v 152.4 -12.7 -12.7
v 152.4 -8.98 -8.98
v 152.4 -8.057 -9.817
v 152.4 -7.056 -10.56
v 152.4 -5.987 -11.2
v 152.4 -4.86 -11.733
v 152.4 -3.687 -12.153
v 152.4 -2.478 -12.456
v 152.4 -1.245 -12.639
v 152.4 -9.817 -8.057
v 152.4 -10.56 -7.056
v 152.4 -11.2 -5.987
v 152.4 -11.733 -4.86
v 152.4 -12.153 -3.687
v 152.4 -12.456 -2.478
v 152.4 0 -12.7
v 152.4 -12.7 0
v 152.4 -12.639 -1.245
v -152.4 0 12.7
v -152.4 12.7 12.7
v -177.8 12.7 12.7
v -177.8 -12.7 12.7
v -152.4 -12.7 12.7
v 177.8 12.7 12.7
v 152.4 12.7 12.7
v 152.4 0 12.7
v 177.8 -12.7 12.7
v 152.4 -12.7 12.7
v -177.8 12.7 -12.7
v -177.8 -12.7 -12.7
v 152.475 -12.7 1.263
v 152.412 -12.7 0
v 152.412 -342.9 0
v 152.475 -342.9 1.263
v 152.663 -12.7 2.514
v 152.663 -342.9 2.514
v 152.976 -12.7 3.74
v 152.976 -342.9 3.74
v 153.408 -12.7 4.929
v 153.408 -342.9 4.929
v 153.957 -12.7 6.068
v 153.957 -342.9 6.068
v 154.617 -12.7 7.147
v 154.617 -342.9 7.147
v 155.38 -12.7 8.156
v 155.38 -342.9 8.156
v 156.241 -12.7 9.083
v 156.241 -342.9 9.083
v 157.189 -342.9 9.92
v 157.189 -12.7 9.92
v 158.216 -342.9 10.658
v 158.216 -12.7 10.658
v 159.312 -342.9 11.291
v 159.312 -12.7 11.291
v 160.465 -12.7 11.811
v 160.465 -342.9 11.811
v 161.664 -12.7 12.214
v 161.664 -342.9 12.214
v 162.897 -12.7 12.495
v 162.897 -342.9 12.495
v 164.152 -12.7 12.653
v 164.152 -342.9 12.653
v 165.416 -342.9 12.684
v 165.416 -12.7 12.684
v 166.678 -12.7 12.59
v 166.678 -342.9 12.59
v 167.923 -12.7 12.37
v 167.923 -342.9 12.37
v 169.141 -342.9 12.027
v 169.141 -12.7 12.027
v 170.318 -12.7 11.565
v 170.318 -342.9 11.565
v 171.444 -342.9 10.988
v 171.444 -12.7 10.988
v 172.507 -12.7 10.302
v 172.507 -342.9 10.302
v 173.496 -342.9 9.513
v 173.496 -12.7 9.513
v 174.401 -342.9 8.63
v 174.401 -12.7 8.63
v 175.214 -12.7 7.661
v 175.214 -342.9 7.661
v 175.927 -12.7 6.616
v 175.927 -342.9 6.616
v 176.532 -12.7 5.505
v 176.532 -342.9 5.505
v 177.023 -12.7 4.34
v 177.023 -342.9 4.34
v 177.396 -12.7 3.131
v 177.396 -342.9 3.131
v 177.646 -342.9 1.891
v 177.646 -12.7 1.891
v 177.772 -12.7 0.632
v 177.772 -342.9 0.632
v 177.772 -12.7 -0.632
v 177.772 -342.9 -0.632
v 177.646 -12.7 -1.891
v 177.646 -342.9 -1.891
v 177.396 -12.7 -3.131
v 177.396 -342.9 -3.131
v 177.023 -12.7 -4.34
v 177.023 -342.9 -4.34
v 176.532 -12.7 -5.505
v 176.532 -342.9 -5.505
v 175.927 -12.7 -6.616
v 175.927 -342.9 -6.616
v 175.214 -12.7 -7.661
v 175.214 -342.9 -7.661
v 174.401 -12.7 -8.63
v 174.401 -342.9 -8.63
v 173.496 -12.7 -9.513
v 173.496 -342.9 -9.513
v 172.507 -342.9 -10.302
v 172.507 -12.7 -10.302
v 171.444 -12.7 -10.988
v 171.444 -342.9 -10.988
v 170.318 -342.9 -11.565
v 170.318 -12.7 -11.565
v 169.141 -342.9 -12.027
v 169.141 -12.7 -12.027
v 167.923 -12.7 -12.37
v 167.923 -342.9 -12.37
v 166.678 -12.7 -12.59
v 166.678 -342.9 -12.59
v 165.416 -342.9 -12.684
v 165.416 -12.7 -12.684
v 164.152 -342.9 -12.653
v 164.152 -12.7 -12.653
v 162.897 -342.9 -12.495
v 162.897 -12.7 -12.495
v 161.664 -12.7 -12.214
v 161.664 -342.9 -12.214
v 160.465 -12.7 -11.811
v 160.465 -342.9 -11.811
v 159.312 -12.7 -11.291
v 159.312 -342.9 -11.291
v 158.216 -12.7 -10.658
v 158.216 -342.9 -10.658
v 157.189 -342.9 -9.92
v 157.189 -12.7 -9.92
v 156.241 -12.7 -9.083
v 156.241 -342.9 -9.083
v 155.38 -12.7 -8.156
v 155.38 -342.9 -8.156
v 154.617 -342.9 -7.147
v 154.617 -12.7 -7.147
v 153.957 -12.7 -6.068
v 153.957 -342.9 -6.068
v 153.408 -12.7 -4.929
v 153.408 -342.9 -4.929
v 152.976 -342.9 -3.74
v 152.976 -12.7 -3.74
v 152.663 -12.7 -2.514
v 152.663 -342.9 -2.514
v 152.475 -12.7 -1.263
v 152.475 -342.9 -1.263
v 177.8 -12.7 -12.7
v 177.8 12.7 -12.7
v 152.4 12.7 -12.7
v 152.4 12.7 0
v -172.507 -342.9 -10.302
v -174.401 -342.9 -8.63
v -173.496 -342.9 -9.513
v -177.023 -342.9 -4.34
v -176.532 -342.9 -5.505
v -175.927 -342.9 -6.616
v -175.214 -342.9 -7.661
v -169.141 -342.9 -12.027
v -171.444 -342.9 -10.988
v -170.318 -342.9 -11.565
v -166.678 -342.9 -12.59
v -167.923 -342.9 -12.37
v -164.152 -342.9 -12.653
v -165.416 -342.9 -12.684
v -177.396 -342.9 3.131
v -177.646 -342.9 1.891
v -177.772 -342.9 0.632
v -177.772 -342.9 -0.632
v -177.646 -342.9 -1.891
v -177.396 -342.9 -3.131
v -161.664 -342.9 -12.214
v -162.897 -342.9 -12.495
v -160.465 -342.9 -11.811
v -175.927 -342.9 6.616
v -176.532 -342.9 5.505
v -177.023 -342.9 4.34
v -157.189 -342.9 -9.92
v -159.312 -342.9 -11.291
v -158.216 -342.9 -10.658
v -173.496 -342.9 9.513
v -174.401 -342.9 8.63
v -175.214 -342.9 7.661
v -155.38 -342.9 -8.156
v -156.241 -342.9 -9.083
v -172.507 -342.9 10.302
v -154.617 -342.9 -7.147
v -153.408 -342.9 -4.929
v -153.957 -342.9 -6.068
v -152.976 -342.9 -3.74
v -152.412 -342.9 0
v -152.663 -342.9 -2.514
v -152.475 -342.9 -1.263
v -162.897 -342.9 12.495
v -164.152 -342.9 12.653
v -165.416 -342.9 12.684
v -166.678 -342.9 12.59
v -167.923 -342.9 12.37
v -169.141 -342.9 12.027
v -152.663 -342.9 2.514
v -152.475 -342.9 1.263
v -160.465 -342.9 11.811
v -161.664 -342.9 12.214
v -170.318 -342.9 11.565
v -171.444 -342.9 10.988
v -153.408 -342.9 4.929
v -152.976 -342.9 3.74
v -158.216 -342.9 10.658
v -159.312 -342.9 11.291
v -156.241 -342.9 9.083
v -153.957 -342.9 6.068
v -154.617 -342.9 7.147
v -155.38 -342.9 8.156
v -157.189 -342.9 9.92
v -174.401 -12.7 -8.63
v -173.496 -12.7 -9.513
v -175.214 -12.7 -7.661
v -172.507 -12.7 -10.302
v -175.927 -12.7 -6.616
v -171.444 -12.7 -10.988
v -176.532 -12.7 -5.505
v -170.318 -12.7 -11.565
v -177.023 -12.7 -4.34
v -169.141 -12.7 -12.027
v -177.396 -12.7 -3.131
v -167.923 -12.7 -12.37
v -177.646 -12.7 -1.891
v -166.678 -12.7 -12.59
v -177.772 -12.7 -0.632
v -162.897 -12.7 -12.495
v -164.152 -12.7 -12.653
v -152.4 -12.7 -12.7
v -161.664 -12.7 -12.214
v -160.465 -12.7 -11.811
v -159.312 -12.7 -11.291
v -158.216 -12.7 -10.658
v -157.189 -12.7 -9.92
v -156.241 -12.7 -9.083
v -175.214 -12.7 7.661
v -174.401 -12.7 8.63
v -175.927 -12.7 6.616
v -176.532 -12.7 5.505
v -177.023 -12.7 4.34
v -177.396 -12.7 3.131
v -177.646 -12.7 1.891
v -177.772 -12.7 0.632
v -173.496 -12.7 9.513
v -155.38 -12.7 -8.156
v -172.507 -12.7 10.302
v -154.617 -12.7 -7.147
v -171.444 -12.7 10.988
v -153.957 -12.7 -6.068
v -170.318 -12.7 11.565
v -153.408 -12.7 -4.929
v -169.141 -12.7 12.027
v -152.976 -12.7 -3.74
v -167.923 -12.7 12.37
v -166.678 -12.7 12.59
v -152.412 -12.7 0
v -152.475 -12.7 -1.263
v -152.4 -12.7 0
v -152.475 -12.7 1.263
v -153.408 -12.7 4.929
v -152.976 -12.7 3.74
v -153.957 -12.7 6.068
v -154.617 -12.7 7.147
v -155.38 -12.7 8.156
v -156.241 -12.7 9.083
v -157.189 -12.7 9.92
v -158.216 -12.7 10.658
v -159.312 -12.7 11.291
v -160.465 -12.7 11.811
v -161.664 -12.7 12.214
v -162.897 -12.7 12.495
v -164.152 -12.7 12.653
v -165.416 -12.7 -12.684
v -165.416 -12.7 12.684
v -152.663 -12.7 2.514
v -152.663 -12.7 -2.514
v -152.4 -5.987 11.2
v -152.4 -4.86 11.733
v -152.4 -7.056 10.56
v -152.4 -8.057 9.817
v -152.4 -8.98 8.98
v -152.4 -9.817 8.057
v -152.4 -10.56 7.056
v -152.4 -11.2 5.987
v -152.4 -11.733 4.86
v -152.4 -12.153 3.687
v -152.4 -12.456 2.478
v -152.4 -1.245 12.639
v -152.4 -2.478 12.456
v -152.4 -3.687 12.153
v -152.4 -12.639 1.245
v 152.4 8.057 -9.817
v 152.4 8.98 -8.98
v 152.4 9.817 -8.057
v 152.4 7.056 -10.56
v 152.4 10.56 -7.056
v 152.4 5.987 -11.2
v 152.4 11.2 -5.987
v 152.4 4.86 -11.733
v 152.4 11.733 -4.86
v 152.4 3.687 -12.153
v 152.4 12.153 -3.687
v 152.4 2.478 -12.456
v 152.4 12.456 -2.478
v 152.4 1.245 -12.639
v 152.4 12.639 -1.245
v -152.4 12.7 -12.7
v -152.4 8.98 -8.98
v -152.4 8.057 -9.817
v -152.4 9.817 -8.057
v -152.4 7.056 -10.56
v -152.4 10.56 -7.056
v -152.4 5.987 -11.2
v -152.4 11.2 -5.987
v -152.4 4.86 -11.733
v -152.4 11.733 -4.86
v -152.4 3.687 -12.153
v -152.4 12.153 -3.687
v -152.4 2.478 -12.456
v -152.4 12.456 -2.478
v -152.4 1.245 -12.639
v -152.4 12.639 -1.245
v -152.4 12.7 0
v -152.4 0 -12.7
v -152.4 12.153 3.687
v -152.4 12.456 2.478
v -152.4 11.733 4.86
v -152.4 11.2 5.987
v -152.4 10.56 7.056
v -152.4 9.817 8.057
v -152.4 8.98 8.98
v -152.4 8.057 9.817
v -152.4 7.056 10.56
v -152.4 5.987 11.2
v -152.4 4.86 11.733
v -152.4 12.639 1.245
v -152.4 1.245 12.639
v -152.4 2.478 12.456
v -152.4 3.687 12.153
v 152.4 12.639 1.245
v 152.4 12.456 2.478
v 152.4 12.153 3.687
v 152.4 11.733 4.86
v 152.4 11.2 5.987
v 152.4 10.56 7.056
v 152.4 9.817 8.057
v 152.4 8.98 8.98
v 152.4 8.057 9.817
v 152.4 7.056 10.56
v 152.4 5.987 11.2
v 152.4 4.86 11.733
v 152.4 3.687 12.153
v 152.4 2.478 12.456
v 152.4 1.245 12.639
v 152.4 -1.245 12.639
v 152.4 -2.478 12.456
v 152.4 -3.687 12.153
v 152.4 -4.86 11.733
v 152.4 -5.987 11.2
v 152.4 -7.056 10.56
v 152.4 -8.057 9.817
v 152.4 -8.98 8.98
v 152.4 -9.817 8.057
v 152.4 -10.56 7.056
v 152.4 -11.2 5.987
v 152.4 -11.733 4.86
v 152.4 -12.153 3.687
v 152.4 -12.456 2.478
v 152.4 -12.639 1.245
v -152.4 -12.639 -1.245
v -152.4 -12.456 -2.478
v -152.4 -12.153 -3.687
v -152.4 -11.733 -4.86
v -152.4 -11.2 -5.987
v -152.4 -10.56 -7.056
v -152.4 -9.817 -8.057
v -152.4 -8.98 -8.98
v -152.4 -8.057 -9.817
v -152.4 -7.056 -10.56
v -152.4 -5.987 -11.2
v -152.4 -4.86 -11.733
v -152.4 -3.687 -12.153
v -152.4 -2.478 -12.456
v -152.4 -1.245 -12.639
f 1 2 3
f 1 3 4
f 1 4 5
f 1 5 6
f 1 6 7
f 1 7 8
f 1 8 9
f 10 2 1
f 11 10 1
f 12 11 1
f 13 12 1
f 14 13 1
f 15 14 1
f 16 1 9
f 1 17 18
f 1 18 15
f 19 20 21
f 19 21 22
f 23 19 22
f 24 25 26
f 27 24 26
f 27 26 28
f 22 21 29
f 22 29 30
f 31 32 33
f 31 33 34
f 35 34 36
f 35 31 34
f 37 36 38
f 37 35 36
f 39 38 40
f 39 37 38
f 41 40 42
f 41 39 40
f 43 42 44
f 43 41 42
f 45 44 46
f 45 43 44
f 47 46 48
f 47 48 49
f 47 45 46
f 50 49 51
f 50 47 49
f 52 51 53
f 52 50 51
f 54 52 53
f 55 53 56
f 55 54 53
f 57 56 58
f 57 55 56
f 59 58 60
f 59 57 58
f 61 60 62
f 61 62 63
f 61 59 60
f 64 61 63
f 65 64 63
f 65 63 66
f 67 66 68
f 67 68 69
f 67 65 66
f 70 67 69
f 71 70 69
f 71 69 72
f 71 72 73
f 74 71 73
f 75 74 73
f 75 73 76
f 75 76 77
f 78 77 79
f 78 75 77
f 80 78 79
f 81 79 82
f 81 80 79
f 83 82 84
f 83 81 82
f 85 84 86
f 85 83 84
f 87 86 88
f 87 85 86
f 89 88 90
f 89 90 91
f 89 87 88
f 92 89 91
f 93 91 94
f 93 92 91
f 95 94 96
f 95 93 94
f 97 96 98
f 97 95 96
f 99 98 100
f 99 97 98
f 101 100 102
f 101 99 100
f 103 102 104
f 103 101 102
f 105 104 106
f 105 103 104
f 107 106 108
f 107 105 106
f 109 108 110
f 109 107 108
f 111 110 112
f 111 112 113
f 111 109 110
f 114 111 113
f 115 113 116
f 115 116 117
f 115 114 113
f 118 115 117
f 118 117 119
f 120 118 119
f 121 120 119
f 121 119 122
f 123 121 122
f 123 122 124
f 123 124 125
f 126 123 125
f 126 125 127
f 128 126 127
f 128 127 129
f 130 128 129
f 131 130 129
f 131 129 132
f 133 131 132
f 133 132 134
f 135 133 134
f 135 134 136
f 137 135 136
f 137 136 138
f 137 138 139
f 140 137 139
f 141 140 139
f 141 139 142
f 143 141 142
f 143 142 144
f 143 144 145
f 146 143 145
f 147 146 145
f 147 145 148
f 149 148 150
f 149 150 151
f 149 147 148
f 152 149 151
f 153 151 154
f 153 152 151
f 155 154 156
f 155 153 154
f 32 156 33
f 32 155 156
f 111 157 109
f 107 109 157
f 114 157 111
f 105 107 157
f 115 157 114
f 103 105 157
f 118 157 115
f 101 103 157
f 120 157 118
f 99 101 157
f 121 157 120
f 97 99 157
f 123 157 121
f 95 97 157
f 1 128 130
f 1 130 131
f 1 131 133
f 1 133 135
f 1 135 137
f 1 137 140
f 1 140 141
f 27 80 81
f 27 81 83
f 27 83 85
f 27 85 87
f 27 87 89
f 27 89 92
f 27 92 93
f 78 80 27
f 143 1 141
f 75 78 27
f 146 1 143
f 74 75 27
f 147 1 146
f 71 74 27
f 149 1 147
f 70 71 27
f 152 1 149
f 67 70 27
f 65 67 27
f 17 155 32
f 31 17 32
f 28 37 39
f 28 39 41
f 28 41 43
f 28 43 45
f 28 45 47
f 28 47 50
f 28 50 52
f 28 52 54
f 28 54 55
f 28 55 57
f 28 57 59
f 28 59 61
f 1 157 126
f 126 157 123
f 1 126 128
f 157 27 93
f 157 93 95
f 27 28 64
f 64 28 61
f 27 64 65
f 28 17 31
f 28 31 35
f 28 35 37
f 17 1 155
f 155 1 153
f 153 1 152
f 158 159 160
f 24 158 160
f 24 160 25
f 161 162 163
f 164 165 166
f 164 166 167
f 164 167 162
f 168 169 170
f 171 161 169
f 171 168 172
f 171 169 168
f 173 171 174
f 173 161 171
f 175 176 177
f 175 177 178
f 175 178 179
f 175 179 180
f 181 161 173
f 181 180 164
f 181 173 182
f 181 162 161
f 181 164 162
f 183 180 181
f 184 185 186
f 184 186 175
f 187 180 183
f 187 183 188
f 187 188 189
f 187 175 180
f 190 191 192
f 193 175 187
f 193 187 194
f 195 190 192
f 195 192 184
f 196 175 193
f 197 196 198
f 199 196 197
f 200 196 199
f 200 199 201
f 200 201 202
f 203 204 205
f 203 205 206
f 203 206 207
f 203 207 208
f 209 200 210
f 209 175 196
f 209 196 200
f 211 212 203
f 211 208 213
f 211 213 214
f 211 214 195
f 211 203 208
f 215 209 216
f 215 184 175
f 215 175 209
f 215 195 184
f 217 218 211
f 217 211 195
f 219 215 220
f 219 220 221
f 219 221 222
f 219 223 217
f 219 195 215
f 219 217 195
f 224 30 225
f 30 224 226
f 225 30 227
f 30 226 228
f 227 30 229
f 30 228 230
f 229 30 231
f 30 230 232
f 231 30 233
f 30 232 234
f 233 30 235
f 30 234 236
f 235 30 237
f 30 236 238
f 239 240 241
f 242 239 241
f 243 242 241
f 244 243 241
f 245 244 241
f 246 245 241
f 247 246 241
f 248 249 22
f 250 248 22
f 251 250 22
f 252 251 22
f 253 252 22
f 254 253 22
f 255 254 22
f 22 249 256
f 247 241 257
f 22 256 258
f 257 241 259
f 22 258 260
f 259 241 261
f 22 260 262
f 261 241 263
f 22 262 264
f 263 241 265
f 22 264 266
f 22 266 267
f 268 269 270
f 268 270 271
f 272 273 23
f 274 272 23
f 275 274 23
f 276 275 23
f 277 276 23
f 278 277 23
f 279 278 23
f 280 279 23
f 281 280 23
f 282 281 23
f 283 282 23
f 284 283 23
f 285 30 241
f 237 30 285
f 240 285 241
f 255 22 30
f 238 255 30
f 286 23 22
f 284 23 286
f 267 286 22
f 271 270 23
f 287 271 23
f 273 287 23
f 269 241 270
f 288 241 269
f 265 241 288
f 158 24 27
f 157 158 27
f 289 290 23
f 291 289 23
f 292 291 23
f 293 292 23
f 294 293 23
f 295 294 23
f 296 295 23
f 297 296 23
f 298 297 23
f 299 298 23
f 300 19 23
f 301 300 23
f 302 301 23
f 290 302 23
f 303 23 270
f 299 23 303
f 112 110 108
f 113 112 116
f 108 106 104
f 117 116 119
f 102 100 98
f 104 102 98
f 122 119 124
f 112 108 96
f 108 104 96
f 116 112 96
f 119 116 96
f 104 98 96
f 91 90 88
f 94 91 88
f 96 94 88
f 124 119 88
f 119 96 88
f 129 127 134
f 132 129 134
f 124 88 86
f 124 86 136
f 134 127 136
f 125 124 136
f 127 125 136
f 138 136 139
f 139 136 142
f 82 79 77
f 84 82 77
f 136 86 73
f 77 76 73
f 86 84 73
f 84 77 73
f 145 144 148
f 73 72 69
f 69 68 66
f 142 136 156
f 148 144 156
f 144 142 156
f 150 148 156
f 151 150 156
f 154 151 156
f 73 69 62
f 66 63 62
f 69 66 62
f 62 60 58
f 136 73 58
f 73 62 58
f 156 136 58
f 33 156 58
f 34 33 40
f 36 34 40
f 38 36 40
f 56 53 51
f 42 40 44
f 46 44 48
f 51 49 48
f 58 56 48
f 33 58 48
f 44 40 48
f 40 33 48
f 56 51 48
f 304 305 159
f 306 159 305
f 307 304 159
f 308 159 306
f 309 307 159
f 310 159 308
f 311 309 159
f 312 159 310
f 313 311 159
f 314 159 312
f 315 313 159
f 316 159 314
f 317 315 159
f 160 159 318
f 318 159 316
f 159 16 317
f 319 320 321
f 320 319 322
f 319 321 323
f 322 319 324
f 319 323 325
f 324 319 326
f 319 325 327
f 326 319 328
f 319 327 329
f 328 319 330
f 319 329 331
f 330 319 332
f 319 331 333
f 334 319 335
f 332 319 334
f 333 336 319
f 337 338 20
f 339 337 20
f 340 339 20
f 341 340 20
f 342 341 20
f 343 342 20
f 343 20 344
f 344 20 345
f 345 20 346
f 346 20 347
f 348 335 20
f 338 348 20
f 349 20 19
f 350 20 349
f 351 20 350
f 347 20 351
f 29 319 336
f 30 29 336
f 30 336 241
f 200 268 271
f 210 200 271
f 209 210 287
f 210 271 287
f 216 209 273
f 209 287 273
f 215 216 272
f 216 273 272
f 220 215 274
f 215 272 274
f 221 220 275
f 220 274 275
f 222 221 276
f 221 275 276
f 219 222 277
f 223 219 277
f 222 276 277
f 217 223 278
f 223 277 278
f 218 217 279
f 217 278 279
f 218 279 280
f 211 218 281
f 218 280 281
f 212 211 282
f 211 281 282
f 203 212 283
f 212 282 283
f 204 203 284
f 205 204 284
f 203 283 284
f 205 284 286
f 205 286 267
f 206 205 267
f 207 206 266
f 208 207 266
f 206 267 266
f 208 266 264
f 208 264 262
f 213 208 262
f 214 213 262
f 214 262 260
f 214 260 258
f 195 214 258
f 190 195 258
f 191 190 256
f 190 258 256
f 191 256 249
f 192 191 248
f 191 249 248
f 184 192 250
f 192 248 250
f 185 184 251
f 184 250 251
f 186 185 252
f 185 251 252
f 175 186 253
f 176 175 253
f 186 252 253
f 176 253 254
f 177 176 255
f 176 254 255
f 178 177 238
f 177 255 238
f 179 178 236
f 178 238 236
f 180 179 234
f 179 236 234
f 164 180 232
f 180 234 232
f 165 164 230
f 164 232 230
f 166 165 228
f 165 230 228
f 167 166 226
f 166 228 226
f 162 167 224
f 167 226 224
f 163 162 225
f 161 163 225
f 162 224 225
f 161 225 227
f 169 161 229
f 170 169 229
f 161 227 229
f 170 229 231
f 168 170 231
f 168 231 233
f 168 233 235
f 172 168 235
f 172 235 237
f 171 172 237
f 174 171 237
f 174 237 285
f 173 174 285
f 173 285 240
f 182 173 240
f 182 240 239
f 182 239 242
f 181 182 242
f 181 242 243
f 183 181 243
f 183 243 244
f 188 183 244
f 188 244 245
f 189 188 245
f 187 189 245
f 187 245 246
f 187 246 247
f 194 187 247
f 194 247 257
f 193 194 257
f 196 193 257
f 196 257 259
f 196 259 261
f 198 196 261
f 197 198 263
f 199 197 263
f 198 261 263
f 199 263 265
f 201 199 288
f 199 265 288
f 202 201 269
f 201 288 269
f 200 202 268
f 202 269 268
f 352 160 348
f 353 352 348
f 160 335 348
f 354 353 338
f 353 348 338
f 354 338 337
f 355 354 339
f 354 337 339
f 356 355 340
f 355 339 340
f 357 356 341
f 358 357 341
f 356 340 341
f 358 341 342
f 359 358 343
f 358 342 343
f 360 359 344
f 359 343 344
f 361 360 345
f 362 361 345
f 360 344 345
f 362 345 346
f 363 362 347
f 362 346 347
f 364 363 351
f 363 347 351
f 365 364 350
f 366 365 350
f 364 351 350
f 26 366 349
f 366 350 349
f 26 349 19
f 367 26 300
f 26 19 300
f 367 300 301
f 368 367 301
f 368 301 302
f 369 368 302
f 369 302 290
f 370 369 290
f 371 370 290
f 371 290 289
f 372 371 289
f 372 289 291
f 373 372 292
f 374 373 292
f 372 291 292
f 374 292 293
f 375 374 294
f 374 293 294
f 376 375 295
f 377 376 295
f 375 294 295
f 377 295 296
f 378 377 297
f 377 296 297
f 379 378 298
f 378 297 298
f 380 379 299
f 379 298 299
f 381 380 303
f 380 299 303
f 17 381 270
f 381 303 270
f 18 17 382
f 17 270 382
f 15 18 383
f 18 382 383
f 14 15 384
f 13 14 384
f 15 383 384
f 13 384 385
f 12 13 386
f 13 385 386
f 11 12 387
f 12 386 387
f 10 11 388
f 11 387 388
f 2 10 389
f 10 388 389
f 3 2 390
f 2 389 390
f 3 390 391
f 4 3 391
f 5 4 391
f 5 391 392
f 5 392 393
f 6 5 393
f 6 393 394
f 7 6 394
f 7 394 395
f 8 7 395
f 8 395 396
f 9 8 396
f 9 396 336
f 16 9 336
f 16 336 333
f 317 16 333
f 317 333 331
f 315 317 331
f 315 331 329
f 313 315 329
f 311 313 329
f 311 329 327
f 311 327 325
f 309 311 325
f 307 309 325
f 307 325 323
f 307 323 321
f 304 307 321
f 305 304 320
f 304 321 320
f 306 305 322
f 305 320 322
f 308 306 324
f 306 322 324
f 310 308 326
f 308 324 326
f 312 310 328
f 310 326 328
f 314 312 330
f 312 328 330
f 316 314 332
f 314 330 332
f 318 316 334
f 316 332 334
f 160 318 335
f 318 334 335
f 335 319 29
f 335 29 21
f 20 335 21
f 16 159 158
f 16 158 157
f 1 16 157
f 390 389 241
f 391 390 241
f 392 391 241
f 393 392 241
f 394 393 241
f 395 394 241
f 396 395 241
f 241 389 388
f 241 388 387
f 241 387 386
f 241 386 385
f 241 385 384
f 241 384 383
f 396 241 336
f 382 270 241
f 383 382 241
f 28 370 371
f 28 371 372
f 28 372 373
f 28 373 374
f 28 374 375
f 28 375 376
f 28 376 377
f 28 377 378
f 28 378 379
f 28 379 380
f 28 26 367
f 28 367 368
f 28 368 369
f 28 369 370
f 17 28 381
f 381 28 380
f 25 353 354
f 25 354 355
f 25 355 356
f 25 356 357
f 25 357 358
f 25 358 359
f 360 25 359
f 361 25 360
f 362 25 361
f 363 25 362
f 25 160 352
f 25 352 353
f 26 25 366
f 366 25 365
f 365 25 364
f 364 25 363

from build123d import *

# Parameters (mm, degrees)
F0_R     = 12.7
F1_DEPTH = 152.4
F2_W     = 25.4
F2_H     = 25.4
F3_DEPTH = 25.4
F4_R     = 12.688144
F5_DEPTH = 330.2


with BuildPart() as f1:
    # F0 (on Right) → F1 (new body)
    with BuildSketch(Plane.YZ):
        Circle(F0_R)
    extrude(amount=-F1_DEPTH)

    # F2 (on face) → F3 (join)
    with BuildSketch(Plane(origin=(-152.4, 0, 0), x_dir=(0, -1, 0), z_dir=(-1, 0, 0))):
        Rectangle(F2_W, F2_H)
    extrude(amount=F3_DEPTH)

    # F4 (on face) → F5 (join)
    with BuildSketch(Plane.XZ.offset(12.7)):
        with Locations((-165.1, 0)):
            Circle(F4_R)
    extrude(amount=F5_DEPTH)

    # F6: F1 across face


with BuildPart() as f1_1:
    add(f1.part)
    add(f1.part.mirror(Plane.YZ))


solid = f1_1.part
